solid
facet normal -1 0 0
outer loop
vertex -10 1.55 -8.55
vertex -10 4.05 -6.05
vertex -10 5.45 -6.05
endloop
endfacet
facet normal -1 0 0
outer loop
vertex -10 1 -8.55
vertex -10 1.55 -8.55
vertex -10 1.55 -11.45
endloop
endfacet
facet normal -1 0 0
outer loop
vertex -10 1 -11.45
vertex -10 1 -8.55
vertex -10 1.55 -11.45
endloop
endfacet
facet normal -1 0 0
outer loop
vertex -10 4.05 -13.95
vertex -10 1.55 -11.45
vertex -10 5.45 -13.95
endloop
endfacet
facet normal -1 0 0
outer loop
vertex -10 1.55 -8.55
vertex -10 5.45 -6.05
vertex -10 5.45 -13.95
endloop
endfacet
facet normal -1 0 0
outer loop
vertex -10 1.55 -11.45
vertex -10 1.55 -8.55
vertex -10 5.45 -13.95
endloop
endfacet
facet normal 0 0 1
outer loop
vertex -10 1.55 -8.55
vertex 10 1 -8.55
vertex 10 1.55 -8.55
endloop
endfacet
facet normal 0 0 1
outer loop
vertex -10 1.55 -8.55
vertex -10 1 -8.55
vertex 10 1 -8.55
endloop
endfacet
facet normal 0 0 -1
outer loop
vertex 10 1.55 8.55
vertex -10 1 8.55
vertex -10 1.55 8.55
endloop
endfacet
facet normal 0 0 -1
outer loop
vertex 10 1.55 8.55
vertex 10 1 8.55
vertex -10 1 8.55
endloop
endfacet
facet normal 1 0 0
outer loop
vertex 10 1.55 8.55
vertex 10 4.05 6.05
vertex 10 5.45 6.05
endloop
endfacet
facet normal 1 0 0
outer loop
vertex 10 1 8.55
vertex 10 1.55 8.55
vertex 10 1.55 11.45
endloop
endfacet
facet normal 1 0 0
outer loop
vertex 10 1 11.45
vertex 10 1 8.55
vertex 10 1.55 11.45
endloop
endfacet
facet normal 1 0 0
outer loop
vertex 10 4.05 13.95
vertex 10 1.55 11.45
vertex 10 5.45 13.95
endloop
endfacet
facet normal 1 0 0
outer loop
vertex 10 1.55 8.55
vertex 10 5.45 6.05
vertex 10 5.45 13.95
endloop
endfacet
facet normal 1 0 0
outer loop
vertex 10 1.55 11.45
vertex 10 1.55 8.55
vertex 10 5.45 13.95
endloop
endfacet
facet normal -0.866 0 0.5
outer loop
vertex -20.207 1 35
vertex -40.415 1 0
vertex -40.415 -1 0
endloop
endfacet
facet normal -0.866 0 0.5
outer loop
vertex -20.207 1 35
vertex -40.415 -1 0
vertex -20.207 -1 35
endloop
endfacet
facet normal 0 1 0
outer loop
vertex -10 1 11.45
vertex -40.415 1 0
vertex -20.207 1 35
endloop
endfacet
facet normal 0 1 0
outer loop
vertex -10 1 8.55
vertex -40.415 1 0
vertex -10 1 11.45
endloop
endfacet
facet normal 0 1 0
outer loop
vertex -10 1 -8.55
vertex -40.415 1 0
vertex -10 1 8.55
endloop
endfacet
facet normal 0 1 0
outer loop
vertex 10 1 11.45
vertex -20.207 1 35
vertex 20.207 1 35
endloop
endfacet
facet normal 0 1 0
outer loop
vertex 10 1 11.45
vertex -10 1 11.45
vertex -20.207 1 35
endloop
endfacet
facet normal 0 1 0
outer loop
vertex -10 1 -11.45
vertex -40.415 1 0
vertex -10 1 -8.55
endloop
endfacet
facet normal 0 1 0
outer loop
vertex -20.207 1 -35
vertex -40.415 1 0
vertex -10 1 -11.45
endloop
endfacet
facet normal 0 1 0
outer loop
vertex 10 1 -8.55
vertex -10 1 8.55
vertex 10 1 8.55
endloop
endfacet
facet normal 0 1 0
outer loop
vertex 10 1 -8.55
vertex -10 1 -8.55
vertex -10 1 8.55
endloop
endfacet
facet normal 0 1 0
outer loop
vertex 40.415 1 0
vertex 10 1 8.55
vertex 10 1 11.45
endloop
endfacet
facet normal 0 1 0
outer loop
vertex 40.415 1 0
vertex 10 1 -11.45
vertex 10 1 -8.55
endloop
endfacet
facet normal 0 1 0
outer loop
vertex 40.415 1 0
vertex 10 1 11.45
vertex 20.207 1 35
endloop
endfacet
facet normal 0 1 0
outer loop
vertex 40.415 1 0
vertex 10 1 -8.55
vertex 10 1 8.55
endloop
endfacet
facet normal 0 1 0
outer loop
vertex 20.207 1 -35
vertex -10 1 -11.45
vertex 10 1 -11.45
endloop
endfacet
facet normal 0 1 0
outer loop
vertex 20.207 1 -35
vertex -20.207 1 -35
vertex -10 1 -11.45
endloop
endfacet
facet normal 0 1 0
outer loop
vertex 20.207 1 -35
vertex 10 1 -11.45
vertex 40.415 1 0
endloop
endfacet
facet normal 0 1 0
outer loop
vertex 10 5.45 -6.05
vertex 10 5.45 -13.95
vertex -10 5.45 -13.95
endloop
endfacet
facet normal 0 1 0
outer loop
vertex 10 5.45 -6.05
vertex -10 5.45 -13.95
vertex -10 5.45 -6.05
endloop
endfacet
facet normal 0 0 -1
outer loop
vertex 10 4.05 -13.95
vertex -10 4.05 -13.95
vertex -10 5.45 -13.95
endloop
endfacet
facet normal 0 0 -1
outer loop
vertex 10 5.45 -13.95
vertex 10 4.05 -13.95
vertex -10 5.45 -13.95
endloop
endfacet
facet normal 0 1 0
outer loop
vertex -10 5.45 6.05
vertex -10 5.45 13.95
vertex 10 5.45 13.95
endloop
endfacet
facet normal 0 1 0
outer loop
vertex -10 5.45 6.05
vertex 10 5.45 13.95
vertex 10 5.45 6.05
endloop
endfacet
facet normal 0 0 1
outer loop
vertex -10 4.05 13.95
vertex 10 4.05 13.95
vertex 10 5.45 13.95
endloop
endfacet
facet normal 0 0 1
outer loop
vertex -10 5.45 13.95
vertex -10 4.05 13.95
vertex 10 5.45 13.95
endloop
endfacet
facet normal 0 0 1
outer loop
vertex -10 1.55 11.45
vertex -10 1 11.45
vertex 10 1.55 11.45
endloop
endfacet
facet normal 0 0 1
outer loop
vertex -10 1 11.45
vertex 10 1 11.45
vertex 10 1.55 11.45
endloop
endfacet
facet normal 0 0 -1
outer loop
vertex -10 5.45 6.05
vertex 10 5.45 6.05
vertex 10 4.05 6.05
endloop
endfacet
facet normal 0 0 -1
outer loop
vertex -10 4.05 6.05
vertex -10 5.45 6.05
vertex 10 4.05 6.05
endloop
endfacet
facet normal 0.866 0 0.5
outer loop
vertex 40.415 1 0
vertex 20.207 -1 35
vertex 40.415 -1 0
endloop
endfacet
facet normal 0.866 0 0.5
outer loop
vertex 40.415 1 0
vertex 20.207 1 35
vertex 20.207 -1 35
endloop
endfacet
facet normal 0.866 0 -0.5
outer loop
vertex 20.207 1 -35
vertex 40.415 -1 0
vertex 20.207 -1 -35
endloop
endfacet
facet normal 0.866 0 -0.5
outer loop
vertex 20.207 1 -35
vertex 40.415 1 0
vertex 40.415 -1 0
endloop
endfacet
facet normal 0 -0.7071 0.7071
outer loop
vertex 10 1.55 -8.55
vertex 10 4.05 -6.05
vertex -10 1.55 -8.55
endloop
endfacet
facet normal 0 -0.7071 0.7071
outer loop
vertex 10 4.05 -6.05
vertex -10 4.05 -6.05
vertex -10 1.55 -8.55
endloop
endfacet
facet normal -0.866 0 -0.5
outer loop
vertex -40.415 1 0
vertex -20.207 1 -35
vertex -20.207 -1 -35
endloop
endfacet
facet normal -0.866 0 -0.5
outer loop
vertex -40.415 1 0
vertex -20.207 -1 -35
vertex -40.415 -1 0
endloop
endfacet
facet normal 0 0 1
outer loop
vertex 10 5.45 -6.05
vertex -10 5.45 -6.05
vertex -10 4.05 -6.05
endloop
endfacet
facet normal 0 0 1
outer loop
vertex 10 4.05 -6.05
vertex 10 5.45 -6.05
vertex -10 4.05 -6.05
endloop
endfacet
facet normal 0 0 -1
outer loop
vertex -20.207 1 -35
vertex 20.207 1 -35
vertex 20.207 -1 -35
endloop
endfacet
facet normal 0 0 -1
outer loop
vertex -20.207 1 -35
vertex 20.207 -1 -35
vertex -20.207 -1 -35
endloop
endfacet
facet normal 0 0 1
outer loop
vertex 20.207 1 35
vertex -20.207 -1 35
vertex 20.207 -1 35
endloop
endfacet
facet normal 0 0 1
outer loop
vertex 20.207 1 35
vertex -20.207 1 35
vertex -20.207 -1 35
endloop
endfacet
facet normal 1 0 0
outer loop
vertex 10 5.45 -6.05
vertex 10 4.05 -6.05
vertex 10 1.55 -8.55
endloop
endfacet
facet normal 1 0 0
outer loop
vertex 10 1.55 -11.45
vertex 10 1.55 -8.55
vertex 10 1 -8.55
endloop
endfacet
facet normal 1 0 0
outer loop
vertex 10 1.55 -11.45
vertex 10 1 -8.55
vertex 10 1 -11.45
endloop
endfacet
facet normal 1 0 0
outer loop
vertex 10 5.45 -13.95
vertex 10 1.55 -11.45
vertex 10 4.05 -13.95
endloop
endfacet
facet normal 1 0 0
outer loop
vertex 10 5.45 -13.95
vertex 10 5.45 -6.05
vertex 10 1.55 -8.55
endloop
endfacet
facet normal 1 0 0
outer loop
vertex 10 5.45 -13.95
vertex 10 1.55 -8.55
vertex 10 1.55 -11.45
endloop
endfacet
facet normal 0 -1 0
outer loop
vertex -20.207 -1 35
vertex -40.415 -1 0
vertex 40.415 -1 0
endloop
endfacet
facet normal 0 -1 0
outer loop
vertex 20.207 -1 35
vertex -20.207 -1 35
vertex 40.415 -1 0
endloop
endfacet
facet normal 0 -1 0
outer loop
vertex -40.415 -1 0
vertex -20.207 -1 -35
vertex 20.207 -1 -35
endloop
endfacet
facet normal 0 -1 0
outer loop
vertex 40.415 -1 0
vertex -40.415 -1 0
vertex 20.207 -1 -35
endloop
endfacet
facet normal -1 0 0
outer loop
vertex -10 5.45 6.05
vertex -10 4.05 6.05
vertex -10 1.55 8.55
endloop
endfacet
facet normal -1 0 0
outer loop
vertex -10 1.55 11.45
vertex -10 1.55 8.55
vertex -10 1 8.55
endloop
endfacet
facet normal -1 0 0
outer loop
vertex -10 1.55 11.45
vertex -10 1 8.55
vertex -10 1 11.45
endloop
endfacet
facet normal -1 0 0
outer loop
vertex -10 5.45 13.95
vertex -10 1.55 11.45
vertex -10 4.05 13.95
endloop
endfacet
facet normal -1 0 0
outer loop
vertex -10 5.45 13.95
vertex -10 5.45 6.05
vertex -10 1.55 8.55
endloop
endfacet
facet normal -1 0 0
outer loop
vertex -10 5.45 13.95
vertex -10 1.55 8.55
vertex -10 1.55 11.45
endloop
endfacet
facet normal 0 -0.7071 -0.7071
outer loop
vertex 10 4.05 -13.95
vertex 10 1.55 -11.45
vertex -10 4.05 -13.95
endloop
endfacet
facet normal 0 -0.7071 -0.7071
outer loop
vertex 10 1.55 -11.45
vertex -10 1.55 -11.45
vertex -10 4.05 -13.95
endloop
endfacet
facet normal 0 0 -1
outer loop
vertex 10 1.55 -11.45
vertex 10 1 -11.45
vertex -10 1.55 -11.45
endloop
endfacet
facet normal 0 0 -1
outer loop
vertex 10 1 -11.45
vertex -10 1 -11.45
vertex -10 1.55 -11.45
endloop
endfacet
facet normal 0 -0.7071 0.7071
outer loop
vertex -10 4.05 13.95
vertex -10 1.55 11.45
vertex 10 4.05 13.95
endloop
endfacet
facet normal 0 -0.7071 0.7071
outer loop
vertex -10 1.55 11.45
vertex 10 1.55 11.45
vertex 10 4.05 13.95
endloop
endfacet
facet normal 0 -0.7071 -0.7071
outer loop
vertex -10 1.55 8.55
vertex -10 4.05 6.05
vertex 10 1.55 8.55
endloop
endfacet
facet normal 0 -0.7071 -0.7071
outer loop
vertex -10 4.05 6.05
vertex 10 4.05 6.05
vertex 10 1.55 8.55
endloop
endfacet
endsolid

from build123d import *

# Parameters (mm, degrees)
BOSS_EXTRUDE1_DEPTH = 1
SKETCH2_W           = 2.9
SKETCH2_H           = 0.55
BOSS_EXTRUDE2_DEPTH = 10


with BuildPart() as part:
    # Sketch1 → Boss-Extrude1 (new, symmetric)
    with BuildSketch(Plane(origin=(0, 0, 0), x_dir=(1, 0, 0), z_dir=(0, 1, 0))):
        Polygon((40.414518843, 0), (20.207259422, 35), (-20.207259422, 35), (-40.414518843, 0), (-20.207259422, -35), (20.207259422, -35), align=None)
    extrude(amount=BOSS_EXTRUDE1_DEPTH, both=True)

    # Sketch2 → Boss-Extrude2 (add, symmetric)
    with BuildSketch(Plane(origin=(0, 0, 0), x_dir=(0, 0, -1), z_dir=(1, 0, 0))):
        Polygon((6.05, 5.45), (6.05, 4.05), (8.55, 1.55), (11.45, 1.55), (13.95, 4.05), (13.95, 5.45), align=None)
        Polygon((-6.05, 5.45), (-6.05, 4.05), (-8.55, 1.55), (-11.45, 1.55), (-13.95, 4.05), (-13.95, 5.45), align=None)
        with Locations((-10, 1.275)):
            Rectangle(SKETCH2_W, SKETCH2_H)
        with Locations((10, 1.275)):
            Rectangle(SKETCH2_W, SKETCH2_H)
    extrude(amount=BOSS_EXTRUDE2_DEPTH, both=True)


solid = part.part
